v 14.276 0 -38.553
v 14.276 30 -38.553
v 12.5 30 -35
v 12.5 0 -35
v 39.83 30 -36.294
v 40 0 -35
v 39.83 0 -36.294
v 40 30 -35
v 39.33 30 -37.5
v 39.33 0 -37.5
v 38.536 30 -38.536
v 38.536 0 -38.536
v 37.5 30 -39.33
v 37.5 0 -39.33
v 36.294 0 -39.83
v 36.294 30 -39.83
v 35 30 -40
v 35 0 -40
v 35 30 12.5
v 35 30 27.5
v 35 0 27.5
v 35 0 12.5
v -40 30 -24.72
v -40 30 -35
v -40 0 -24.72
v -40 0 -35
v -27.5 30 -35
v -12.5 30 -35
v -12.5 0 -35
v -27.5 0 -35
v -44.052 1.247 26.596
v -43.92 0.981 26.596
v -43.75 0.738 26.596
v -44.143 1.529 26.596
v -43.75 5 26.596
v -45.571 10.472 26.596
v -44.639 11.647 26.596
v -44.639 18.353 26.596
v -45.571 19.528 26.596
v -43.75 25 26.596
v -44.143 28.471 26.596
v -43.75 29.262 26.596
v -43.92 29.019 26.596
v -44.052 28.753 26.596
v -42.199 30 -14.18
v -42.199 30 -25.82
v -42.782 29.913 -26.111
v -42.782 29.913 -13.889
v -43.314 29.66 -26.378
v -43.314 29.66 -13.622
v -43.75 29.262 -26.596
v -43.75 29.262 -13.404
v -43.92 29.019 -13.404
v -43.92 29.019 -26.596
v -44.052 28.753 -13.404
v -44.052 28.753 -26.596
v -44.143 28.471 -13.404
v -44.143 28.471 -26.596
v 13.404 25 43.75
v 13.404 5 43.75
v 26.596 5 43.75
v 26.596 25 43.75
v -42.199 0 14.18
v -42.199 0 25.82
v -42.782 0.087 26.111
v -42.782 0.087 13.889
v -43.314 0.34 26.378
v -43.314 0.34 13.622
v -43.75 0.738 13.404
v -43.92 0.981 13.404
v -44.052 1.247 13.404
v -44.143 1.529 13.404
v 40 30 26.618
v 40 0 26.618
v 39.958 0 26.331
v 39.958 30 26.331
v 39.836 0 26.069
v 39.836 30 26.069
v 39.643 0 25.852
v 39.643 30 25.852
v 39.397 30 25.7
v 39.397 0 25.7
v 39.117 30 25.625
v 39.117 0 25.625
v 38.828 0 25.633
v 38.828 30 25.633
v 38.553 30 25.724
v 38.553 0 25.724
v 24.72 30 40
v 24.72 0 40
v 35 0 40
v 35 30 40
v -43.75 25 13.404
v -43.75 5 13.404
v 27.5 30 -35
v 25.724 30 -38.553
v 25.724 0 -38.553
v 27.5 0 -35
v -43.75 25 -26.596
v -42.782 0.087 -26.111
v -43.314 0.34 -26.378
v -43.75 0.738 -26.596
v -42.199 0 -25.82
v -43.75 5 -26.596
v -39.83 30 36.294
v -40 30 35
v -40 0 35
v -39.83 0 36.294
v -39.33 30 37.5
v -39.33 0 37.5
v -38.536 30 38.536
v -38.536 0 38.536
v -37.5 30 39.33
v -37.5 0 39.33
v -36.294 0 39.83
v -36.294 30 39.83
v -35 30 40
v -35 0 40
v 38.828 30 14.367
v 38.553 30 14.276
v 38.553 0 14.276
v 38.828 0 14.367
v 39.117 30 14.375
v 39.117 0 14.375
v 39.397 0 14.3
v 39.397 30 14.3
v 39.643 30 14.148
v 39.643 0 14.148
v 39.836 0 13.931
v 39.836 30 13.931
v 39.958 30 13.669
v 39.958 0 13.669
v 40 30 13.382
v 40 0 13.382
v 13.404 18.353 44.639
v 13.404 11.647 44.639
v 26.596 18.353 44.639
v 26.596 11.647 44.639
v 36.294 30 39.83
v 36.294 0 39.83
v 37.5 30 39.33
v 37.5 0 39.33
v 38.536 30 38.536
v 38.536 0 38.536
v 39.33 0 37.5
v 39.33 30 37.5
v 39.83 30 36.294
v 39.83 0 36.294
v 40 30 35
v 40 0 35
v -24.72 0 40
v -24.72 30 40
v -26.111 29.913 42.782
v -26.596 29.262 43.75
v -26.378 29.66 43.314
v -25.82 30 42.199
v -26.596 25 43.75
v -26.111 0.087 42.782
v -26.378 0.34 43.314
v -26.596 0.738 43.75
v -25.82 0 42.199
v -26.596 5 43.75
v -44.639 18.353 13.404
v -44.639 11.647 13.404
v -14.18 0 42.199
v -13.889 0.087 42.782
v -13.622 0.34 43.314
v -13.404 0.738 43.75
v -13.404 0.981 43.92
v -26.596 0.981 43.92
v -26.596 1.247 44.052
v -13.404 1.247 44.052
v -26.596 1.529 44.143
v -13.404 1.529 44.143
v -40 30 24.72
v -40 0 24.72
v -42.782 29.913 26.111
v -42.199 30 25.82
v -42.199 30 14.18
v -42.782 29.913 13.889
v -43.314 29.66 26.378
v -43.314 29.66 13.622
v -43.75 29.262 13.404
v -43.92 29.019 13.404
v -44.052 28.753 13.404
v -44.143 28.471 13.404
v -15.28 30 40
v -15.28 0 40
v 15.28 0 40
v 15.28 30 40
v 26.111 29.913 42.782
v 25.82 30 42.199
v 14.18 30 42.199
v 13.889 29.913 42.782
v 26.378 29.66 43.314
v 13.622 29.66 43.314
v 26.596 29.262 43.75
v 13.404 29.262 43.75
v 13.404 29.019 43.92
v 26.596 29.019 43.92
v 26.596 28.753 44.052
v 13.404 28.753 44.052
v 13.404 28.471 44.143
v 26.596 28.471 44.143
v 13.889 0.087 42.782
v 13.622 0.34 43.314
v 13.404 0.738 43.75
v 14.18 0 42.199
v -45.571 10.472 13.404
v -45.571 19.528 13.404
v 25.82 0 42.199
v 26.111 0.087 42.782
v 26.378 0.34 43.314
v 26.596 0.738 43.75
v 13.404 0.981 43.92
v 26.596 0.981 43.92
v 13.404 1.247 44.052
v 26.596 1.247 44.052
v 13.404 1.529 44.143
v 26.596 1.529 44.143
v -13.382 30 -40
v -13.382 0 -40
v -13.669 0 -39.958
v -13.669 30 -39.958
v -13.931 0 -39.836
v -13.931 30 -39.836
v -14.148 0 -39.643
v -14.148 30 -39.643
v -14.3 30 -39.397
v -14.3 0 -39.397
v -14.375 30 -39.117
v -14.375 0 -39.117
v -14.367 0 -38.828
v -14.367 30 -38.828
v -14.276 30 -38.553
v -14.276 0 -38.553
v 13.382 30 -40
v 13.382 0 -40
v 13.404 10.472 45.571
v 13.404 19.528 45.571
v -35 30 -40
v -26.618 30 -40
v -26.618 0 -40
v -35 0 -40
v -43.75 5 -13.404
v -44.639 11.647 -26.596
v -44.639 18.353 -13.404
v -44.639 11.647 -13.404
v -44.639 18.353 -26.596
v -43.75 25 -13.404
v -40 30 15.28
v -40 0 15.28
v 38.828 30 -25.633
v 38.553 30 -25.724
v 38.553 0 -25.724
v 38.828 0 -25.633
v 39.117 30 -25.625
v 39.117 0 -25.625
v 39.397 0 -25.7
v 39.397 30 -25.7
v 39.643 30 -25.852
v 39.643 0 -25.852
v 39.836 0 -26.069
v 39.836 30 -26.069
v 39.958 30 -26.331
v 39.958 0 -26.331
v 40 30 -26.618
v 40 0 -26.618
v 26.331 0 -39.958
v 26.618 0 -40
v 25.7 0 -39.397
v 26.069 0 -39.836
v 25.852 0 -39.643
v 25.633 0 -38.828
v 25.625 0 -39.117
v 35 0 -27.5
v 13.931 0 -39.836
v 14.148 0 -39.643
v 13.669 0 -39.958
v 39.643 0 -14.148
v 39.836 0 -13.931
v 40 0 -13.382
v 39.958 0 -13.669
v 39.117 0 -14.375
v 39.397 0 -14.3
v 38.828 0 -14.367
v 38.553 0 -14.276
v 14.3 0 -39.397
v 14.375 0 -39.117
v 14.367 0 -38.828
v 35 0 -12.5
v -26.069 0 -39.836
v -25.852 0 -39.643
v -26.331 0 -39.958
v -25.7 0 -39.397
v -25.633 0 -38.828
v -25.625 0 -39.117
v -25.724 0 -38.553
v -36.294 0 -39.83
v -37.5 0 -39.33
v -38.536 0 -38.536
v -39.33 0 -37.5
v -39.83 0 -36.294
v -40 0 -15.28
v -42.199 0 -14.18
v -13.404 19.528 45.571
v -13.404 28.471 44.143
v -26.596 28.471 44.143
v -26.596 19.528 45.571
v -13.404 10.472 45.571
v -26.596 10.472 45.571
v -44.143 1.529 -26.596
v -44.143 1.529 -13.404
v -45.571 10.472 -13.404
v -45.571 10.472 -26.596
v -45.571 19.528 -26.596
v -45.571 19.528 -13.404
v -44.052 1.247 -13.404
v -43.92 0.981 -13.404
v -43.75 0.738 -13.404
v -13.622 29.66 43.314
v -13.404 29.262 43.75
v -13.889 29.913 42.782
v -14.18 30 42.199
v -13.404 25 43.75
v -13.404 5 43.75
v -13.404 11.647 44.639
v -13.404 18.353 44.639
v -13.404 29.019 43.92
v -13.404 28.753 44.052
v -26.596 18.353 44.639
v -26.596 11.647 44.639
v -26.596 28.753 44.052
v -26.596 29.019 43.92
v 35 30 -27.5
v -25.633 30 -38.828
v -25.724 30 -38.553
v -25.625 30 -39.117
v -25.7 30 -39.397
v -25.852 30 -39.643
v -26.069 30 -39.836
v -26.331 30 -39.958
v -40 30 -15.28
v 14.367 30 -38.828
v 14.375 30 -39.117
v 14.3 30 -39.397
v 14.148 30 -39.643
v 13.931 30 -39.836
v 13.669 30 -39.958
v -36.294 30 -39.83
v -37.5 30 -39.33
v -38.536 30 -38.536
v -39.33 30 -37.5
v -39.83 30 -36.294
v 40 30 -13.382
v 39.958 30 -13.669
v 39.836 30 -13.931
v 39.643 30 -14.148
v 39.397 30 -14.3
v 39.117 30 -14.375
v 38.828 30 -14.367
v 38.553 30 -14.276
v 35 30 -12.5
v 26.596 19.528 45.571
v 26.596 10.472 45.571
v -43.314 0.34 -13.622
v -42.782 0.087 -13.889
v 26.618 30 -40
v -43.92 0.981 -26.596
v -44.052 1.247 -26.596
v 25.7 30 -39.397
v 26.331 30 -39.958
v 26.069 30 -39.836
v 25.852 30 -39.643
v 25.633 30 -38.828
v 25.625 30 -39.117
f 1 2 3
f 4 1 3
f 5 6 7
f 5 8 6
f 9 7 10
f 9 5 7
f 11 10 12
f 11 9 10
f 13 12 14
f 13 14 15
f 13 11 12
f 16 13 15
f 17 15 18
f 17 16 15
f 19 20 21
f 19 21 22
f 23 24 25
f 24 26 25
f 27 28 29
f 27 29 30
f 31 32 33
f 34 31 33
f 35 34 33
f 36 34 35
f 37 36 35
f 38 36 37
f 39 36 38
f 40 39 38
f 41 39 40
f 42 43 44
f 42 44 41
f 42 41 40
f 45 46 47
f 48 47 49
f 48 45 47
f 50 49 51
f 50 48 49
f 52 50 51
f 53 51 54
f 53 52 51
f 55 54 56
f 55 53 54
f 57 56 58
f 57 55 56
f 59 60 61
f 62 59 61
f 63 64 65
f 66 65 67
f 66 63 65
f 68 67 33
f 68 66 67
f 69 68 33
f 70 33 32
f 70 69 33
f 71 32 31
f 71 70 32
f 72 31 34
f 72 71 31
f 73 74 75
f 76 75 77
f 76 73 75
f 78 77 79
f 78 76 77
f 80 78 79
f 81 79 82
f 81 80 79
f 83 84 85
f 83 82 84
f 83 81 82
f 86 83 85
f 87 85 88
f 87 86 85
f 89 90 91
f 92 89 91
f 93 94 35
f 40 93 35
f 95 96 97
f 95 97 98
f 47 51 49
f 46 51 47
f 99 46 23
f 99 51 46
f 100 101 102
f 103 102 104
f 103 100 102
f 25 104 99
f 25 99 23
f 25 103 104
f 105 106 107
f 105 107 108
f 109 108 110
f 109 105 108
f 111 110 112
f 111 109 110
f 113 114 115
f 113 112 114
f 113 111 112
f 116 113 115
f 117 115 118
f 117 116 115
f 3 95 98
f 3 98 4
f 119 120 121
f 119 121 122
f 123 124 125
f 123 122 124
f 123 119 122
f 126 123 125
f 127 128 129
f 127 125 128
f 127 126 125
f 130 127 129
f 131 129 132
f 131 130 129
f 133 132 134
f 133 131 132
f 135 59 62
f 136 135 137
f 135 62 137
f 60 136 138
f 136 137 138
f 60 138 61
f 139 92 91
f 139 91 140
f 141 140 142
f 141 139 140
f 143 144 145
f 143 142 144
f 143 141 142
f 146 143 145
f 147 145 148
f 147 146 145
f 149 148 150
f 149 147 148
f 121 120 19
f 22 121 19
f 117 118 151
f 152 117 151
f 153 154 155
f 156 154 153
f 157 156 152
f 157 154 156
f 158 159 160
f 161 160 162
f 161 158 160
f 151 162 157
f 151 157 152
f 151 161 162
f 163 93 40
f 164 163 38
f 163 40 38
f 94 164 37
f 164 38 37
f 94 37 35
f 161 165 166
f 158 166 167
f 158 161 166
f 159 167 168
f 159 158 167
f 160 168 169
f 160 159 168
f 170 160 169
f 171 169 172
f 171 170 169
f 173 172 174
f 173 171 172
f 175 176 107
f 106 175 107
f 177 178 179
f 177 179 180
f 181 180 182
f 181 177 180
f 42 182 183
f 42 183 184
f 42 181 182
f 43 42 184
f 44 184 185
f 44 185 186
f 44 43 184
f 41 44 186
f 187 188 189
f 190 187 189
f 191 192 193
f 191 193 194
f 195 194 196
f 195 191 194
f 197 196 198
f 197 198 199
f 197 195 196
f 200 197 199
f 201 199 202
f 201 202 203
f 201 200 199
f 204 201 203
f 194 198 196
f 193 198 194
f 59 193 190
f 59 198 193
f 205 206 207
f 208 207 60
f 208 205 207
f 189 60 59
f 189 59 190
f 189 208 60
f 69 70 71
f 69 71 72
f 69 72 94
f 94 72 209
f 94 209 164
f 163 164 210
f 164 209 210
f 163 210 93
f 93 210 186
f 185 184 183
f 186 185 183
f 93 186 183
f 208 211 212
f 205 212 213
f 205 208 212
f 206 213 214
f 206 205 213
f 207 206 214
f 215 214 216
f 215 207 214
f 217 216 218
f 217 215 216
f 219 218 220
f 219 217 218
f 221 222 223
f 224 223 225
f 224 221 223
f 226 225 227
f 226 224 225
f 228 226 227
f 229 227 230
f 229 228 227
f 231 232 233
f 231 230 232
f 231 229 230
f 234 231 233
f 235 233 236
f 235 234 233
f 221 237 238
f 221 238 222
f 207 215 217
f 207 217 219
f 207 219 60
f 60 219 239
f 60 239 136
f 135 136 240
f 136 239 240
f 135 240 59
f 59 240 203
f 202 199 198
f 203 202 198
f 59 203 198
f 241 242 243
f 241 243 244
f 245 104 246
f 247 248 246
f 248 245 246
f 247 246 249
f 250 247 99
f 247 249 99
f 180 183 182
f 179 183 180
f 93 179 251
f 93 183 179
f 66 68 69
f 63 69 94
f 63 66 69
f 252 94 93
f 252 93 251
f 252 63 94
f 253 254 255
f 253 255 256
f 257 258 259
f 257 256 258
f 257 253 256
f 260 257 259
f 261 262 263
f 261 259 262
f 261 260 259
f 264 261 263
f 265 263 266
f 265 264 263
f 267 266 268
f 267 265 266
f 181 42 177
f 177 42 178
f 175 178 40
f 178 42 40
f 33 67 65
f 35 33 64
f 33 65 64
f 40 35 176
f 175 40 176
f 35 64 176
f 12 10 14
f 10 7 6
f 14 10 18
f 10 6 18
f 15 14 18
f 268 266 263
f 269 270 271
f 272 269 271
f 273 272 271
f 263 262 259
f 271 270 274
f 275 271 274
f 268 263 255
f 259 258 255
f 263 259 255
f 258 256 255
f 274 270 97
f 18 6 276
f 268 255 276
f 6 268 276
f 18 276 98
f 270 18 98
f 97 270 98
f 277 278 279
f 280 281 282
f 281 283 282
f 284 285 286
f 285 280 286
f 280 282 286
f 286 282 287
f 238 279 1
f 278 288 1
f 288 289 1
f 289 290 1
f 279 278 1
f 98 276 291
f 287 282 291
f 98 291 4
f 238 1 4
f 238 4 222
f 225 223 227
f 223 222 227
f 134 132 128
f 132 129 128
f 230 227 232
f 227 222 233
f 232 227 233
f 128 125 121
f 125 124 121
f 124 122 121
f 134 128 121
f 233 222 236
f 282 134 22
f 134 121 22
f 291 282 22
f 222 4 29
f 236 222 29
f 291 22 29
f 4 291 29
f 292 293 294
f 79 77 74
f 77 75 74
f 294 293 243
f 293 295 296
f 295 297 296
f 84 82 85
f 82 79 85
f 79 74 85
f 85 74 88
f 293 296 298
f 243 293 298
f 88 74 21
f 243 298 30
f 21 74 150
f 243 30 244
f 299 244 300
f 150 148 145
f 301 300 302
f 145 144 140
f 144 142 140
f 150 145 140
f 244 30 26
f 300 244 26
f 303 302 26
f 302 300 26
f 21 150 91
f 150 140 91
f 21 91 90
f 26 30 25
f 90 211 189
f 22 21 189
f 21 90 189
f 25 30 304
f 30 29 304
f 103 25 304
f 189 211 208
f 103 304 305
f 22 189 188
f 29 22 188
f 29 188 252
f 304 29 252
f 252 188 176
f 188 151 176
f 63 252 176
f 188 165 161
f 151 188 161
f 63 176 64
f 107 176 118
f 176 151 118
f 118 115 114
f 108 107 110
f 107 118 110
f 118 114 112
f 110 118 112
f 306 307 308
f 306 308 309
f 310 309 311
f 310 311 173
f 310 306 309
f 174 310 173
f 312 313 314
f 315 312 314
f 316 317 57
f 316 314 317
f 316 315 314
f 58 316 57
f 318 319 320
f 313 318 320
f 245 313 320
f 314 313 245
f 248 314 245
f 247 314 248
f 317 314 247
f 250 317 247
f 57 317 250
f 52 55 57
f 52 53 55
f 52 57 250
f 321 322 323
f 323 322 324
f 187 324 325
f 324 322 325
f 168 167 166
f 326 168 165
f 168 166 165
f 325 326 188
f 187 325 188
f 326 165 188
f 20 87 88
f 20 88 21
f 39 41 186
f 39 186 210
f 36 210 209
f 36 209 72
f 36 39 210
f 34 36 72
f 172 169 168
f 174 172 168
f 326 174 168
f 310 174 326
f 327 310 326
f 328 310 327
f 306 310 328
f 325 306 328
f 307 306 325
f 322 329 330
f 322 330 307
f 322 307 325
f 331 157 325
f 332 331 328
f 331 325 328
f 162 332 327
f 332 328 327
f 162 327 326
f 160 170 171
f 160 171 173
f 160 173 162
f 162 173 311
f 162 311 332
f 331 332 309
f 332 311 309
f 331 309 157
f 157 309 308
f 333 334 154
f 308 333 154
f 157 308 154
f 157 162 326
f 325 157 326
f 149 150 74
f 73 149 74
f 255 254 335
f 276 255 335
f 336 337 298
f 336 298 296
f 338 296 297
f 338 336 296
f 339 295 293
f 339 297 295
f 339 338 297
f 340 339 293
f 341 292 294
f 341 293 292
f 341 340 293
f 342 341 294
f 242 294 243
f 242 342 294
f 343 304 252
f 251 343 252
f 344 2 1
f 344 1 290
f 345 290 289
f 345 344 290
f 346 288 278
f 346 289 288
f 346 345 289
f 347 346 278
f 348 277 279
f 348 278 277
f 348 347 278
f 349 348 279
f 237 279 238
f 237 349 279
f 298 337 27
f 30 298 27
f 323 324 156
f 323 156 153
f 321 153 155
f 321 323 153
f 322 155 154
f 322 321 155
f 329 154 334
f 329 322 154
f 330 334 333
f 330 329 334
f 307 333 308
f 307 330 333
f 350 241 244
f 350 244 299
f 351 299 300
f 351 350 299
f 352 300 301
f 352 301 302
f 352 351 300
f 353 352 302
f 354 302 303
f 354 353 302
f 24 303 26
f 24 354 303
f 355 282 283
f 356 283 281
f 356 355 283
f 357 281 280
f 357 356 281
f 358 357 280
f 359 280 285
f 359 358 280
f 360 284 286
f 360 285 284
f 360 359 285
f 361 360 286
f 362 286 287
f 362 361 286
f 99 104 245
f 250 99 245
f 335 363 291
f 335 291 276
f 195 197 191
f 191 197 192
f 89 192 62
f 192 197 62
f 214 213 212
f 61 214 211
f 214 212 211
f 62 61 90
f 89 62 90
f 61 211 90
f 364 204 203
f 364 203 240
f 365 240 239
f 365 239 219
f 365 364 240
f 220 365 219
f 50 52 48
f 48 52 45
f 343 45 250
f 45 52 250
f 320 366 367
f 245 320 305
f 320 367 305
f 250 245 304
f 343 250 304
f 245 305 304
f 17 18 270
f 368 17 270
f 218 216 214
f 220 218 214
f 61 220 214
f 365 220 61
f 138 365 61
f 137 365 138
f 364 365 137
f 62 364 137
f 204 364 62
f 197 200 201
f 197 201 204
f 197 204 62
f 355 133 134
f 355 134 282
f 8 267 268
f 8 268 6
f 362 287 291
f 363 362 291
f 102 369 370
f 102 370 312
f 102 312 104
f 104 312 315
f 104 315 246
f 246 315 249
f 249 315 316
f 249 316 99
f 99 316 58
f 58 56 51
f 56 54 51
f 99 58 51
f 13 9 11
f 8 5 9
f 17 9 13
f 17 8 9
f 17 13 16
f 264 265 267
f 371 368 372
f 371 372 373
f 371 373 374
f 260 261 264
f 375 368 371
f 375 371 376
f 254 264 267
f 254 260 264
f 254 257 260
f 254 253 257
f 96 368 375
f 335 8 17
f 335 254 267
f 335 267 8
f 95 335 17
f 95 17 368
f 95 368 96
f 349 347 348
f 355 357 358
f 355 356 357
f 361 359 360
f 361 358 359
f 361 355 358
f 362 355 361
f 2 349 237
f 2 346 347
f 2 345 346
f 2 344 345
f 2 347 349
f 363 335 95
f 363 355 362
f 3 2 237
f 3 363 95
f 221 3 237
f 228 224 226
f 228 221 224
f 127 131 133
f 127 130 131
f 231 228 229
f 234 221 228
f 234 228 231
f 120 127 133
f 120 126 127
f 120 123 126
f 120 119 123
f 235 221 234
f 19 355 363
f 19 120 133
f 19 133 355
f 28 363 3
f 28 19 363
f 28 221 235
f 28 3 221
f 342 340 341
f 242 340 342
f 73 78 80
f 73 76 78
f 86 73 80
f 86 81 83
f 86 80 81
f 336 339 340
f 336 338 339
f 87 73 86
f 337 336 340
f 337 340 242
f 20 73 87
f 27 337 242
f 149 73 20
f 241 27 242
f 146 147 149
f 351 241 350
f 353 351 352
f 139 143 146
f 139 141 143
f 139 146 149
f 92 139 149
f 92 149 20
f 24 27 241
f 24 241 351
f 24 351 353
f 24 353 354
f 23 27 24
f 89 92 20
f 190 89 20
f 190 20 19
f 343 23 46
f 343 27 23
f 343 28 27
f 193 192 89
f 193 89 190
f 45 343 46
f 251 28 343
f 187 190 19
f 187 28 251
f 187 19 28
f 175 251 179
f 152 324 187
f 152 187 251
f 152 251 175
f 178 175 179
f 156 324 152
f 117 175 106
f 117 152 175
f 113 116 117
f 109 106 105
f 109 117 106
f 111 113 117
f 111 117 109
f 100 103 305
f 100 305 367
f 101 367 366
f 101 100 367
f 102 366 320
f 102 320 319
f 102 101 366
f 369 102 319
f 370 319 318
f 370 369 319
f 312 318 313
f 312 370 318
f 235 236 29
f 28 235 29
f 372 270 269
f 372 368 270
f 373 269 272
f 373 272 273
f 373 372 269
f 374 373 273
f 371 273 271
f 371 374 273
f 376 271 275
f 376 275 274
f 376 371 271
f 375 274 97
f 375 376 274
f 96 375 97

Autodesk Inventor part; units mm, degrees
ref_plane "YZ Plane" through (0, 0, 0) normal (1, 0, 0) x (0, 1, 0)
sketch "Sketch2" plane through (0, 0, 0) normal (0, 1, 0) x (-1, 0, 0)
  line L0 (-40, -40) -> (40, -40)
  line L1 (40, -40) -> (40, 40)
  line L2 (40, 40) -> (-40, 40)
  line L3 (-40, 40) -> (-40, -40)
  line L4 (-40, -40) -> (40, 40) construction
  line L5 (40, -40) -> (-40, 40) construction
  line L6 (0, 40) -> (40, 40)
  line L7 (20, 40) -> (20, 45)
  line L8 (20, 45) -> (27.5, 45)
  line L9 (20, 40) -> (25, 40)
  line L10 (25, 40) -> (27.5, 45)
  line L11 (20, 45) -> (12.5, 45)
  line L12 (20, 40) -> (15, 40)
  line L13 (15, 40) -> (12.5, 45)
  line L14 (20, 44.75) -> (27.0955, 44.75)
  line L15 (27.0955, 44.75) -> (24.8455, 40.25)
  line L16 (24.8455, 40.25) -> (20, 40.25)
  line L17 (20, 44.75) -> (12.9045, 44.75)
  line L18 (12.9045, 44.75) -> (15.1545, 40.25)
  line L19 (15.1545, 40.25) -> (20, 40.25)
  line L20 (20, 44.75) -> (20, 43.75)
  line L21 (20, 43.75) -> (26.875, 43.75)
  line L22 (20, 43.75) -> (13.125, 43.75)
  line L23 (40, 20) -> (45, 20)
  line L24 (45, 20) -> (45, 27.5)
  line L25 (40, 20) -> (40, 25)
  line L26 (40, 25) -> (45, 27.5)
  line L27 (40, 20) -> (40, 15)
  line L28 (40, 15) -> (45, 12.5)
  line L29 (45, 20) -> (45, 12.5)
  line L30 (44.75, 20) -> (44.75, 27.0955)
  line L31 (44.75, 27.0955) -> (40.25, 24.8455)
  line L32 (40.25, 24.8455) -> (40.25, 20)
  line L33 (44.75, 20) -> (44.75, 12.9045)
  line L34 (44.75, 12.9045) -> (40.25, 15.1545)
  line L35 (40.25, 15.1545) -> (40.25, 20)
  line L36 (44.75, 20) -> (43.75, 20)
  line L37 (43.75, 20) -> (43.75, 26.875)
  line L38 (43.75, 20) -> (43.75, 13.125)
  line L39 (-20, 40) -> (-20, 45)
  line L40 (-20, 44.75) -> (-20, 43.75)
  line L41 (-24.8455, 40.25) -> (-20, 40.25)
  line L42 (-20, 40) -> (-25, 40)
  line L43 (-27.0955, 44.75) -> (-24.8455, 40.25)
  line L44 (-25, 40) -> (-27.5, 45)
  line L45 (-20, 43.75) -> (-26.875, 43.75)
  line L46 (-20, 45) -> (-27.5, 45)
  line L47 (-20, 44.75) -> (-27.0955, 44.75)
  line L48 (-15.1545, 40.25) -> (-20, 40.25)
  line L49 (-20, 40) -> (-15, 40)
  line L50 (-20, 43.75) -> (-13.125, 43.75)
  line L51 (-20, 44.75) -> (-12.9045, 44.75)
  line L52 (-20, 45) -> (-12.5, 45)
  line L53 (-12.9045, 44.75) -> (-15.1545, 40.25)
  line L54 (-15, 40) -> (-12.5, 45)
  line L55 (40, -20) -> (40, -15)
  line L56 (44.75, -12.9045) -> (40.25, -15.1545)
  line L57 (40, -15) -> (45, -12.5)
  line L58 (43.75, -20) -> (43.75, -13.125)
  line L59 (44.75, -20) -> (44.75, -12.9045)
  line L60 (45, -20) -> (45, -12.5)
  line L61 (40.25, -15.1545) -> (40.25, -20)
  line L62 (40, -20) -> (45, -20)
  line L63 (40.25, -24.8455) -> (40.25, -20)
  line L64 (40, -20) -> (40, -25)
  line L65 (44.75, -27.0955) -> (40.25, -24.8455)
  line L66 (40, -25) -> (45, -27.5)
  line L67 (43.75, -20) -> (43.75, -26.875)
  line L68 (44.75, -20) -> (44.75, -27.0955)
  line L69 (45, -20) -> (45, -27.5)
  line L70 (44.75, -20) -> (43.75, -20)
  line L71 (20, -35) -> (27.5, -35)
  line L72 (25, -40) -> (27.5, -35)
  line L73 (20, -35) -> (12.5, -35)
  line L74 (15, -40) -> (12.5, -35)
  line L75 (-15, -40) -> (-12.5, -35)
  line L76 (-20, -35) -> (-12.5, -35)
  line L77 (-25, -40) -> (-27.5, -35)
  line L78 (-20, -35) -> (-27.5, -35)
  line L79 (24.8455, 40.25) -> (24.7205, 40)
  line L80 (15.1545, 40.25) -> (15.2795, 40)
  line L81 (-15.1545, 40.25) -> (-15.2795, 40)
  line L82 (-24.8455, 40.25) -> (-24.7205, 40)
  line L83 (40.25, 24.8455) -> (40, 24.7205)
  line L84 (40.25, 15.1545) -> (40, 15.2795)
  line L85 (40.25, -24.8455) -> (40, -24.7205)
  line L86 (40.25, -15.1545) -> (40, -15.2795)
  line L87 (-40, -25) -> (-35, -27.5)
  line L88 (-35, -20) -> (-35, -27.5)
  line L89 (-35, -20) -> (-35, -12.5)
  line L90 (-40, -15) -> (-35, -12.5)
  line L91 (-35, 20) -> (-35, 12.5)
  line L92 (-35, 20) -> (-35, 27.5)
  line L93 (-40, 15) -> (-35, 12.5)
  line L94 (-40, 25) -> (-35, 27.5)
  point P0 (0, 0)
  point P1 (26.875, -36.25)
  point P2 (13.125, -36.25)
  point P3 (-13.125, -36.25)
  point P4 (-26.875, -36.25)
  point P5 (-13.4045, 43.75)
  point P6 (-26.5955, 43.75)
  point P7 (43.75, -26.5955)
  point P8 (43.75, -13.4045)
  point P9 (43.75, 13.4045)
  point P10 (43.75, 26.5955)
  point P11 (26.5955, 43.75)
  point P12 (13.4045, 43.75)
  point P13 (-36.25, -26.875)
  point P14 (-36.25, -13.125)
  point P15 (-36.25, 13.125)
  point P16 (-36.25, 26.875)
  dimension "d0" = 80
  dimension "d1" = 80
  dimension "d2" = 5
  dimension "d3" = 7.5
  dimension "d4" = 5
  dimension "d5" = 0.25
  dimension "d6" = 0.25
  dimension "d7" = 1
  dimension "d10" = 40
  dimension "d17" = 40
  dimension "d24" = 80
  dimension "d51" = 80
extrude "Extrusion1" add sketch "Sketch2" along normal blind 30 contours L3 L87 L88 L89 L90 L93 L91 L92 L94 L2 L1 L0 L72 L71 L73 L74 L75 L76 L78 L77 | L1 L62 L63 L85 | L82 L41 L39 L2 | L1 L86 L61 L62 | L63 L62 L67 L65 | L39 L48 L81 L2 | L43 L45 L39 L41 | L61 L56 L58 L62 | L39 L50 L53 L48 | L1 L23 L35 L84 | L1 L83 L32 L23 | L35 L23 L38 L34 | L80 L19 L7 L2 | L32 L31 L37 L23 | L7 L16 L79 L2 | L18 L22 L7 L19 | L7 L21 L15 L16
fillet "Fillet1" radius 1 8 edges at (-25, 15, -40) (-15, 15, -40) (15, 15, -40) (25, 15, -40) (40, 15, 15) (40, 15, 25) (40, 15, -15) (40, 15, -25)
fillet "Fillet2" radius 5 4 edges at (-40, 15, 40) (40, 15, 40) (40, 15, -40) (-40, 15, -40)
ref_plane "Work Plane1" through (-13.4045, 0, 43.75) normal (1, 0, 0) x (0, 1, 0)
sketch "Sketch3" plane through (-13.4045, 0, 43.75) normal (1, 0, 0) x (0, 1, 0)
  line L0 (0, -3.75) -> (30, -3.75) projected
  line L1 (15, -3.75) -> (15, 2)
  line L2 (15, 2) -> (15, 1)
  line L3 (30, -3.75) -> (30, 0) projected
  arc A0 (30, 0) -> (0, 0) centre (15, -55.25) ccw
  line L4 (30, 0) -> (25, 0)
  line L5 (0, 0) -> (30, 0) projected
  line L6 (25, 0) -> (5, 0)
  arc A1 (25, 0) -> (5, 0) centre (15, -49.5) ccw
  point P0 (0, -43.75)
  dimension "d34" = 5.75
  dimension "d35" = 1
  dimension "d36" = 5
  dimension "d37" = 20
extrude "Extrusion2" add sketch "Sketch3" against normal blind 13.191 contours L4 A1 L1 A0 | A1 L5 A0 L1
sketch "Sketch4" plane through (0, 30, 0) normal (0, 1, 0) x (1, 0, 0)
  line L0 (-26.5955, -43.75) -> (-13.4045, -43.75) projected
  line L1 (-20, -43.75) -> (-20, 0)
  line L2 (-20, 0) -> (-43.75, -20)
  line L3 (-43.75, -13.4045) -> (-43.75, -26.5955) projected
  line L4 (-43.75, -20) -> (-20, -20)
  point P0 (0, 0)
pattern_circular "Circular Pattern1" count 2 over 270 about axis through (-20, 30, 20) along (0, 1, 0) of "Extrusion2"
pattern_linear "Rectangular Pattern1" count 2 spacing 40 along (1, 0, 0) of "Extrusion2"
ref_plane "Work Plane2" through (-43.75, 0, -26.5955) normal (0, 0, 1) x (0, 1, 0)
sketch "Sketch5" plane through (-43.75, 0, -26.5955) normal (0, 0, 1) x (0, 1, 0)
  line L0 (30, 0) -> (30, -3.75) projected
  line L1 (0, 0) -> (30, 0) projected
  arc A0 (30, 0) -> (0, 0) centre (15, -55.25) ccw
  arc A1 (25, 0) -> (5, 0) centre (15, -49.5) ccw projected
  arc A2 (25, 0) -> (5, 0) centre (15, -49.5) ccw
  point P0 (0, -43.75)
extrude "Extrusion3" add sketch "Sketch5" along normal blind 13.191 contours A0 L1 A1
fillet "Fillet3" radius 2 8 edges at (-26.5955, 30, 43.75) (-20, 0, 43.75) (20, 30, 43.75) (20, 0, 43.75) (-43.75, 30, 20) (-43.75, 30, -13.4045) (-43.75, 0, -13.4045) (-43.75, 0, 20)
properties part number "2x2Base"
